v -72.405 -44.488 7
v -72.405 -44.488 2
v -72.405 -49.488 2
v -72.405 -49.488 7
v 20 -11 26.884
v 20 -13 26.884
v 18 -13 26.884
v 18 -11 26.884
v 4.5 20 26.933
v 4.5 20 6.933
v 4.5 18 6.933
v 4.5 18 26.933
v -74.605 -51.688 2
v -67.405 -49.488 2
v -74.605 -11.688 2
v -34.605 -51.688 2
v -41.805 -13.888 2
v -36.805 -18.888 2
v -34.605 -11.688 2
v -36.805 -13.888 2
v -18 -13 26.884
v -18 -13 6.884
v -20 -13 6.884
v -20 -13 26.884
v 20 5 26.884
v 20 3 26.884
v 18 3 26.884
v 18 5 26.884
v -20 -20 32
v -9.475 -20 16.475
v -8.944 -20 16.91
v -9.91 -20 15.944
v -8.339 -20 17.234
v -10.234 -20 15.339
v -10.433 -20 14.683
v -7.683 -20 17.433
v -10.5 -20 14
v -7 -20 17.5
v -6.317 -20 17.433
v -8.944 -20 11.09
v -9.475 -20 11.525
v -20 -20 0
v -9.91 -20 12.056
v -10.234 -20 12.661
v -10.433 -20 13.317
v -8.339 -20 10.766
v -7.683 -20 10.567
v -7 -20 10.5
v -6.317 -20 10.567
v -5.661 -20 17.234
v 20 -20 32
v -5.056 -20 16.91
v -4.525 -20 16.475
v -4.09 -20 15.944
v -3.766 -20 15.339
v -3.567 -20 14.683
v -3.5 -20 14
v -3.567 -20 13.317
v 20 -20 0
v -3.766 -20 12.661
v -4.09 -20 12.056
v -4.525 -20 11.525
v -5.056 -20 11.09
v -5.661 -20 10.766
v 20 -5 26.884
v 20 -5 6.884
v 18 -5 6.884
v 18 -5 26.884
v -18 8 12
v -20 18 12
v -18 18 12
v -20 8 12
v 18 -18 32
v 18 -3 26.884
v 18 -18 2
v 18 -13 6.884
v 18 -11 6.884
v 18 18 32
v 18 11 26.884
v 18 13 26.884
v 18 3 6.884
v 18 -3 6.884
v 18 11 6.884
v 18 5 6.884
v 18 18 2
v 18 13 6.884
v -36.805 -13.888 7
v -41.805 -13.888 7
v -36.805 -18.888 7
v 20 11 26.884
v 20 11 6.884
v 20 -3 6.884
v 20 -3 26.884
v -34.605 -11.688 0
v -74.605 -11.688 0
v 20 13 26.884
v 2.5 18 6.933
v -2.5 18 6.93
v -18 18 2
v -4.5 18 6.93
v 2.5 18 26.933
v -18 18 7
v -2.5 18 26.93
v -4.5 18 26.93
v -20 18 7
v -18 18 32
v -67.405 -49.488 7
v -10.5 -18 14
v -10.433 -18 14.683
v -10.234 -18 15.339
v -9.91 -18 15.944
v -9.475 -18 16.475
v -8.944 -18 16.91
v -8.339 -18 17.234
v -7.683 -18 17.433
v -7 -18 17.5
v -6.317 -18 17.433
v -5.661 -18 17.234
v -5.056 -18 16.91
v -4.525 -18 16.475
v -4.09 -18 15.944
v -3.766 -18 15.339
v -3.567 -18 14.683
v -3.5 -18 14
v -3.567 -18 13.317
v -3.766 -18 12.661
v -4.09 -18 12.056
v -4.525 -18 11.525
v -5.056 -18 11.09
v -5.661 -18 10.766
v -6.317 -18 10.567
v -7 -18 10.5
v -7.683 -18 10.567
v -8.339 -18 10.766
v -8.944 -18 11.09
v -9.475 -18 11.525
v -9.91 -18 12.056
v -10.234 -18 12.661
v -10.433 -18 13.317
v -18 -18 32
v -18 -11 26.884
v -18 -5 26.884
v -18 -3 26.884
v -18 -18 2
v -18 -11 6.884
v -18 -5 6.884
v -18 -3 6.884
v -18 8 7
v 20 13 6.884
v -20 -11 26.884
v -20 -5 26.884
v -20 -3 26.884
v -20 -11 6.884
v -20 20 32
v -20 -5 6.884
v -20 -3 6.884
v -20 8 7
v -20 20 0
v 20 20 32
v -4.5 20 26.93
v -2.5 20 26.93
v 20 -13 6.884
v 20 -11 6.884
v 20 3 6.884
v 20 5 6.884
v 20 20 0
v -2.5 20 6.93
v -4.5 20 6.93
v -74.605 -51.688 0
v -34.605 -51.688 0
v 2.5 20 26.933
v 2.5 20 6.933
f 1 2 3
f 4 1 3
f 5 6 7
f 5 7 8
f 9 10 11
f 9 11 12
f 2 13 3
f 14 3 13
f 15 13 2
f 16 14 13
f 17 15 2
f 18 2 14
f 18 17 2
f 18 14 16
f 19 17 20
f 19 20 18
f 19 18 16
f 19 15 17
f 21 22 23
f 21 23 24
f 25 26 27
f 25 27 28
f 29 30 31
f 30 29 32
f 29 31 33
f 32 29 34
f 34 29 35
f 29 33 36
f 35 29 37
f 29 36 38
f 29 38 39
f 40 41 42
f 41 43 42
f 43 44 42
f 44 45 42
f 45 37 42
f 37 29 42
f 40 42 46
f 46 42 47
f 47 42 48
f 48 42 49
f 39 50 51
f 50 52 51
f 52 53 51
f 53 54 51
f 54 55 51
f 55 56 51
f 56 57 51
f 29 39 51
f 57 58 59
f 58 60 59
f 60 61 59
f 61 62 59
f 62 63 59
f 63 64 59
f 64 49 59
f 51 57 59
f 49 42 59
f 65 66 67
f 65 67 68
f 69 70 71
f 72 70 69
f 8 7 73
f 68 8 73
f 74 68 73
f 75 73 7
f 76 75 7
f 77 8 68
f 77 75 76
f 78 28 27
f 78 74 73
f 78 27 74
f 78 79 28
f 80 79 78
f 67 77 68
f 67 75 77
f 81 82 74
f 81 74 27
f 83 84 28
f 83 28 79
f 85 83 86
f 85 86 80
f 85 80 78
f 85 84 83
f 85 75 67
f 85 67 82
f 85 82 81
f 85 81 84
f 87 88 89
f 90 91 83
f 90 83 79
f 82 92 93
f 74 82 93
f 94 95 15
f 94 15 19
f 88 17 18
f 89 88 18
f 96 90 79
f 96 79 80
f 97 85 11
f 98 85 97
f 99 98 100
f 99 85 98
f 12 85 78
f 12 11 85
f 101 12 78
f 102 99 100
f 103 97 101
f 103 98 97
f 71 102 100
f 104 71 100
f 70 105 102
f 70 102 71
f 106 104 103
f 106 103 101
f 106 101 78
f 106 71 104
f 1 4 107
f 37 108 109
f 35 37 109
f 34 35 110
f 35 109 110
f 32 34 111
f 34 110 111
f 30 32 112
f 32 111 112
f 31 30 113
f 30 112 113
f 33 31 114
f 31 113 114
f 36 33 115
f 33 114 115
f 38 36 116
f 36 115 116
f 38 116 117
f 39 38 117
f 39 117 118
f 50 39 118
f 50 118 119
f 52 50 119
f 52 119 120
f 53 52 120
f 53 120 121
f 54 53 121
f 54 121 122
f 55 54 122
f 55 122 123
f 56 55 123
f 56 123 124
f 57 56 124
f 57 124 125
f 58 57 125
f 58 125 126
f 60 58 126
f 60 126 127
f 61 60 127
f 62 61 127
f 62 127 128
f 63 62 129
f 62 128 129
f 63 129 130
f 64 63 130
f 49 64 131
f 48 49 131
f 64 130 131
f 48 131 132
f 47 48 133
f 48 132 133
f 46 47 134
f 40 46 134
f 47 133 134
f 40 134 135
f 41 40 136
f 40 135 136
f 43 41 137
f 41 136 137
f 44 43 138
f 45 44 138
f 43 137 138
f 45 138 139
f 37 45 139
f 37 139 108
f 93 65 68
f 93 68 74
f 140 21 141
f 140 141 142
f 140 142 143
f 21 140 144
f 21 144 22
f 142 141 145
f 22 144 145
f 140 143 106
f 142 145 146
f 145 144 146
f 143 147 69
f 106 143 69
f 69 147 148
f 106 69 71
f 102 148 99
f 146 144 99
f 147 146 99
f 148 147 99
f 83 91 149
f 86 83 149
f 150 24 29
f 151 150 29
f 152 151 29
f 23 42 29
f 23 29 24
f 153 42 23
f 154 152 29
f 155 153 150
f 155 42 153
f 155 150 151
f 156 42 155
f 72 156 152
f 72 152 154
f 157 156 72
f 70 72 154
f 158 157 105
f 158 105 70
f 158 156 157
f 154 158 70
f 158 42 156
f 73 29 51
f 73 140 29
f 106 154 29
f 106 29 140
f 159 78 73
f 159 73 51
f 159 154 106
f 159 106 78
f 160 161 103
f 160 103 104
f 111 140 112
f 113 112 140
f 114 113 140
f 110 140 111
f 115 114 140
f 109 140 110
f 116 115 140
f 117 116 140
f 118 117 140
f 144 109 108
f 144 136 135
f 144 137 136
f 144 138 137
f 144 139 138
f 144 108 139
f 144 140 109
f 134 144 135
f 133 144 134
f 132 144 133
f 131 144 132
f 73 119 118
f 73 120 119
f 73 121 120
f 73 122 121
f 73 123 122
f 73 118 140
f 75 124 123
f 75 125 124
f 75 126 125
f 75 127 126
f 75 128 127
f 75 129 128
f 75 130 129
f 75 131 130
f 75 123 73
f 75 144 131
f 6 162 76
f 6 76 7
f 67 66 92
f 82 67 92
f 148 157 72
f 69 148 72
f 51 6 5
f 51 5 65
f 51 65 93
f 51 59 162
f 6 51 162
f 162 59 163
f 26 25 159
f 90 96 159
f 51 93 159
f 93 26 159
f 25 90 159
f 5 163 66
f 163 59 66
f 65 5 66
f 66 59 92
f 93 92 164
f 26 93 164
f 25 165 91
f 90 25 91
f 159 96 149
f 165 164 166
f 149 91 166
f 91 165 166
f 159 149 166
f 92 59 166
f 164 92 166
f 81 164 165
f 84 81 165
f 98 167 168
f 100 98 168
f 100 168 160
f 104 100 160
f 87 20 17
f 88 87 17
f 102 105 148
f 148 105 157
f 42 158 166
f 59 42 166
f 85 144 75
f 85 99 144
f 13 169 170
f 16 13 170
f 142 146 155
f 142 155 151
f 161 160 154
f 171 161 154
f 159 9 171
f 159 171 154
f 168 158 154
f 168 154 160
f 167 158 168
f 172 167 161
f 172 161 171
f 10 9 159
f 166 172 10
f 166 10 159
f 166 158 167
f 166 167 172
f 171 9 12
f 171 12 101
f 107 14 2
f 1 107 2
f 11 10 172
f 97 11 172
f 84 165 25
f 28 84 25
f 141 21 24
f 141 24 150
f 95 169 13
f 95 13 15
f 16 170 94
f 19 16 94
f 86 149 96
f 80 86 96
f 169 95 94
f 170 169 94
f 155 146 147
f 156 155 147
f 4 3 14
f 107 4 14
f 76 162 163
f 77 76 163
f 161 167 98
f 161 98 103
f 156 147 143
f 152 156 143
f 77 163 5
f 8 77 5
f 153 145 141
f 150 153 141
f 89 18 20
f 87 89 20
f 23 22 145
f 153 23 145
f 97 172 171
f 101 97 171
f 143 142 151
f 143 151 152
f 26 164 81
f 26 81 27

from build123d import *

# Parameters (mm, degrees)
F0_W      = 40
F0_H      = 40
F0_W_2    = 36
F0_H_2    = 36
F1_DEPTH  = 2
F2_DEPTH  = 32
F3_W      = 10
F3_H      = 5
F4_DEPTH  = 2
F6_D      = 7
F6_DEPTH  = 5
F6_TIP    = 2.1030121666
F7_W      = 2
F7_H      = 20
F8_DEPTH  = 40
F9_DEPTH  = 25
F10_W     = 2
F10_H     = 20
F11_DEPTH = 25
F12_W     = 40
F12_H     = 40
F13_DEPTH = 2
F14_DEPTH = 7


with BuildPart() as f1:
    # F0 (on Top) → F1 (new body)
    with BuildSketch(Plane.XY):
        Rectangle(F0_W, F0_H)
        Rectangle(F0_W_2, F0_H_2, mode=Mode.SUBTRACT)
        Rectangle(F0_W_2, F0_H_2)
    extrude(amount=F1_DEPTH)

    # F0 (on Top) → F2 (join)
    with BuildSketch(Plane.XY):
        Rectangle(F0_W, F0_H)
        Rectangle(F0_W_2, F0_H_2, mode=Mode.SUBTRACT)
    extrude(amount=F2_DEPTH)

    # F3 (on face) → F4 (cut)
    with BuildSketch(Plane(origin=(-20, 0, 0), x_dir=(0, -1, 0), z_dir=(-1, 0, 0))):
        with Locations((-13, 9.5)):
            Rectangle(F3_W, F3_H)
    extrude(amount=-F4_DEPTH, mode=Mode.SUBTRACT)

    # F6
    with Locations(Plane.XZ.offset(20)):
        with Locations((-7, 14)):
            Hole(F6_D / 2, depth=F6_DEPTH)
            with Locations((0, 0, -(F6_DEPTH + F6_TIP / 2))):  # 118° drill point
                Cone(0, F6_D / 2, F6_TIP, mode=Mode.SUBTRACT)

    # F7 (on face) → F8 (cut)
    with BuildSketch(Plane.YZ.offset(20)):
        with Locations((-12, 16.8844033033)):
            Rectangle(F7_W, F7_H)
        with Locations((-4, 16.8844033033)):
            Rectangle(F7_W, F7_H)
    extrude(amount=-F8_DEPTH, mode=Mode.SUBTRACT)

    # F7 (on face) → F9 (cut)
    with BuildSketch(Plane.YZ.offset(20)):
        with Locations((4, 16.8844033033)):
            Rectangle(F7_W, F7_H)
        with Locations((12, 16.8844033033)):
            Rectangle(F7_W, F7_H)
    extrude(amount=-F9_DEPTH, mode=Mode.SUBTRACT)

    # F10 (on face) → F11 (cut)
    with BuildSketch(Plane(origin=(0, 20, 0), x_dir=(-1, 0, 0), z_dir=(0, 1, 0))):
        with Locations((-3.5, 16.9328343759)):
            Rectangle(F10_W, F10_H)
        with Locations((3.5, 16.9299475346)):
            Rectangle(F10_W, F10_H)
    extrude(amount=-F11_DEPTH, mode=Mode.SUBTRACT)


with BuildPart() as f13:
    # F12 (on Top) → F13 (new body)
    with BuildSketch(Plane.XY):
        with Locations((-54.6050996959, -31.6884810731)):
            Rectangle(F12_W, F12_H)
        Polygon((-72.4050996959, -44.4884810731), (-67.4050996959, -49.4884810731), (-72.4050996959, -49.4884810731), align=None, mode=Mode.SUBTRACT)
        Polygon((-41.8050996959, -13.8884810731), (-36.8050996959, -13.8884810731), (-36.8050996959, -18.8884810731), align=None, mode=Mode.SUBTRACT)
        Polygon((-72.4050996959, -49.4884810731), (-67.4050996959, -49.4884810731), (-72.4050996959, -44.4884810731), align=None)
        Polygon((-36.8050996959, -18.8884810731), (-36.8050996959, -13.8884810731), (-41.8050996959, -13.8884810731), align=None)
    extrude(amount=F13_DEPTH)

    # F12 (on Top) → F14 (join)
    with BuildSketch(Plane.XY):
        Polygon((-72.4050996959, -49.4884810731), (-67.4050996959, -49.4884810731), (-72.4050996959, -44.4884810731), align=None)
        Polygon((-36.8050996959, -18.8884810731), (-36.8050996959, -13.8884810731), (-41.8050996959, -13.8884810731), align=None)
    extrude(amount=F14_DEPTH)


solid = Compound([f1.part, f13.part])
